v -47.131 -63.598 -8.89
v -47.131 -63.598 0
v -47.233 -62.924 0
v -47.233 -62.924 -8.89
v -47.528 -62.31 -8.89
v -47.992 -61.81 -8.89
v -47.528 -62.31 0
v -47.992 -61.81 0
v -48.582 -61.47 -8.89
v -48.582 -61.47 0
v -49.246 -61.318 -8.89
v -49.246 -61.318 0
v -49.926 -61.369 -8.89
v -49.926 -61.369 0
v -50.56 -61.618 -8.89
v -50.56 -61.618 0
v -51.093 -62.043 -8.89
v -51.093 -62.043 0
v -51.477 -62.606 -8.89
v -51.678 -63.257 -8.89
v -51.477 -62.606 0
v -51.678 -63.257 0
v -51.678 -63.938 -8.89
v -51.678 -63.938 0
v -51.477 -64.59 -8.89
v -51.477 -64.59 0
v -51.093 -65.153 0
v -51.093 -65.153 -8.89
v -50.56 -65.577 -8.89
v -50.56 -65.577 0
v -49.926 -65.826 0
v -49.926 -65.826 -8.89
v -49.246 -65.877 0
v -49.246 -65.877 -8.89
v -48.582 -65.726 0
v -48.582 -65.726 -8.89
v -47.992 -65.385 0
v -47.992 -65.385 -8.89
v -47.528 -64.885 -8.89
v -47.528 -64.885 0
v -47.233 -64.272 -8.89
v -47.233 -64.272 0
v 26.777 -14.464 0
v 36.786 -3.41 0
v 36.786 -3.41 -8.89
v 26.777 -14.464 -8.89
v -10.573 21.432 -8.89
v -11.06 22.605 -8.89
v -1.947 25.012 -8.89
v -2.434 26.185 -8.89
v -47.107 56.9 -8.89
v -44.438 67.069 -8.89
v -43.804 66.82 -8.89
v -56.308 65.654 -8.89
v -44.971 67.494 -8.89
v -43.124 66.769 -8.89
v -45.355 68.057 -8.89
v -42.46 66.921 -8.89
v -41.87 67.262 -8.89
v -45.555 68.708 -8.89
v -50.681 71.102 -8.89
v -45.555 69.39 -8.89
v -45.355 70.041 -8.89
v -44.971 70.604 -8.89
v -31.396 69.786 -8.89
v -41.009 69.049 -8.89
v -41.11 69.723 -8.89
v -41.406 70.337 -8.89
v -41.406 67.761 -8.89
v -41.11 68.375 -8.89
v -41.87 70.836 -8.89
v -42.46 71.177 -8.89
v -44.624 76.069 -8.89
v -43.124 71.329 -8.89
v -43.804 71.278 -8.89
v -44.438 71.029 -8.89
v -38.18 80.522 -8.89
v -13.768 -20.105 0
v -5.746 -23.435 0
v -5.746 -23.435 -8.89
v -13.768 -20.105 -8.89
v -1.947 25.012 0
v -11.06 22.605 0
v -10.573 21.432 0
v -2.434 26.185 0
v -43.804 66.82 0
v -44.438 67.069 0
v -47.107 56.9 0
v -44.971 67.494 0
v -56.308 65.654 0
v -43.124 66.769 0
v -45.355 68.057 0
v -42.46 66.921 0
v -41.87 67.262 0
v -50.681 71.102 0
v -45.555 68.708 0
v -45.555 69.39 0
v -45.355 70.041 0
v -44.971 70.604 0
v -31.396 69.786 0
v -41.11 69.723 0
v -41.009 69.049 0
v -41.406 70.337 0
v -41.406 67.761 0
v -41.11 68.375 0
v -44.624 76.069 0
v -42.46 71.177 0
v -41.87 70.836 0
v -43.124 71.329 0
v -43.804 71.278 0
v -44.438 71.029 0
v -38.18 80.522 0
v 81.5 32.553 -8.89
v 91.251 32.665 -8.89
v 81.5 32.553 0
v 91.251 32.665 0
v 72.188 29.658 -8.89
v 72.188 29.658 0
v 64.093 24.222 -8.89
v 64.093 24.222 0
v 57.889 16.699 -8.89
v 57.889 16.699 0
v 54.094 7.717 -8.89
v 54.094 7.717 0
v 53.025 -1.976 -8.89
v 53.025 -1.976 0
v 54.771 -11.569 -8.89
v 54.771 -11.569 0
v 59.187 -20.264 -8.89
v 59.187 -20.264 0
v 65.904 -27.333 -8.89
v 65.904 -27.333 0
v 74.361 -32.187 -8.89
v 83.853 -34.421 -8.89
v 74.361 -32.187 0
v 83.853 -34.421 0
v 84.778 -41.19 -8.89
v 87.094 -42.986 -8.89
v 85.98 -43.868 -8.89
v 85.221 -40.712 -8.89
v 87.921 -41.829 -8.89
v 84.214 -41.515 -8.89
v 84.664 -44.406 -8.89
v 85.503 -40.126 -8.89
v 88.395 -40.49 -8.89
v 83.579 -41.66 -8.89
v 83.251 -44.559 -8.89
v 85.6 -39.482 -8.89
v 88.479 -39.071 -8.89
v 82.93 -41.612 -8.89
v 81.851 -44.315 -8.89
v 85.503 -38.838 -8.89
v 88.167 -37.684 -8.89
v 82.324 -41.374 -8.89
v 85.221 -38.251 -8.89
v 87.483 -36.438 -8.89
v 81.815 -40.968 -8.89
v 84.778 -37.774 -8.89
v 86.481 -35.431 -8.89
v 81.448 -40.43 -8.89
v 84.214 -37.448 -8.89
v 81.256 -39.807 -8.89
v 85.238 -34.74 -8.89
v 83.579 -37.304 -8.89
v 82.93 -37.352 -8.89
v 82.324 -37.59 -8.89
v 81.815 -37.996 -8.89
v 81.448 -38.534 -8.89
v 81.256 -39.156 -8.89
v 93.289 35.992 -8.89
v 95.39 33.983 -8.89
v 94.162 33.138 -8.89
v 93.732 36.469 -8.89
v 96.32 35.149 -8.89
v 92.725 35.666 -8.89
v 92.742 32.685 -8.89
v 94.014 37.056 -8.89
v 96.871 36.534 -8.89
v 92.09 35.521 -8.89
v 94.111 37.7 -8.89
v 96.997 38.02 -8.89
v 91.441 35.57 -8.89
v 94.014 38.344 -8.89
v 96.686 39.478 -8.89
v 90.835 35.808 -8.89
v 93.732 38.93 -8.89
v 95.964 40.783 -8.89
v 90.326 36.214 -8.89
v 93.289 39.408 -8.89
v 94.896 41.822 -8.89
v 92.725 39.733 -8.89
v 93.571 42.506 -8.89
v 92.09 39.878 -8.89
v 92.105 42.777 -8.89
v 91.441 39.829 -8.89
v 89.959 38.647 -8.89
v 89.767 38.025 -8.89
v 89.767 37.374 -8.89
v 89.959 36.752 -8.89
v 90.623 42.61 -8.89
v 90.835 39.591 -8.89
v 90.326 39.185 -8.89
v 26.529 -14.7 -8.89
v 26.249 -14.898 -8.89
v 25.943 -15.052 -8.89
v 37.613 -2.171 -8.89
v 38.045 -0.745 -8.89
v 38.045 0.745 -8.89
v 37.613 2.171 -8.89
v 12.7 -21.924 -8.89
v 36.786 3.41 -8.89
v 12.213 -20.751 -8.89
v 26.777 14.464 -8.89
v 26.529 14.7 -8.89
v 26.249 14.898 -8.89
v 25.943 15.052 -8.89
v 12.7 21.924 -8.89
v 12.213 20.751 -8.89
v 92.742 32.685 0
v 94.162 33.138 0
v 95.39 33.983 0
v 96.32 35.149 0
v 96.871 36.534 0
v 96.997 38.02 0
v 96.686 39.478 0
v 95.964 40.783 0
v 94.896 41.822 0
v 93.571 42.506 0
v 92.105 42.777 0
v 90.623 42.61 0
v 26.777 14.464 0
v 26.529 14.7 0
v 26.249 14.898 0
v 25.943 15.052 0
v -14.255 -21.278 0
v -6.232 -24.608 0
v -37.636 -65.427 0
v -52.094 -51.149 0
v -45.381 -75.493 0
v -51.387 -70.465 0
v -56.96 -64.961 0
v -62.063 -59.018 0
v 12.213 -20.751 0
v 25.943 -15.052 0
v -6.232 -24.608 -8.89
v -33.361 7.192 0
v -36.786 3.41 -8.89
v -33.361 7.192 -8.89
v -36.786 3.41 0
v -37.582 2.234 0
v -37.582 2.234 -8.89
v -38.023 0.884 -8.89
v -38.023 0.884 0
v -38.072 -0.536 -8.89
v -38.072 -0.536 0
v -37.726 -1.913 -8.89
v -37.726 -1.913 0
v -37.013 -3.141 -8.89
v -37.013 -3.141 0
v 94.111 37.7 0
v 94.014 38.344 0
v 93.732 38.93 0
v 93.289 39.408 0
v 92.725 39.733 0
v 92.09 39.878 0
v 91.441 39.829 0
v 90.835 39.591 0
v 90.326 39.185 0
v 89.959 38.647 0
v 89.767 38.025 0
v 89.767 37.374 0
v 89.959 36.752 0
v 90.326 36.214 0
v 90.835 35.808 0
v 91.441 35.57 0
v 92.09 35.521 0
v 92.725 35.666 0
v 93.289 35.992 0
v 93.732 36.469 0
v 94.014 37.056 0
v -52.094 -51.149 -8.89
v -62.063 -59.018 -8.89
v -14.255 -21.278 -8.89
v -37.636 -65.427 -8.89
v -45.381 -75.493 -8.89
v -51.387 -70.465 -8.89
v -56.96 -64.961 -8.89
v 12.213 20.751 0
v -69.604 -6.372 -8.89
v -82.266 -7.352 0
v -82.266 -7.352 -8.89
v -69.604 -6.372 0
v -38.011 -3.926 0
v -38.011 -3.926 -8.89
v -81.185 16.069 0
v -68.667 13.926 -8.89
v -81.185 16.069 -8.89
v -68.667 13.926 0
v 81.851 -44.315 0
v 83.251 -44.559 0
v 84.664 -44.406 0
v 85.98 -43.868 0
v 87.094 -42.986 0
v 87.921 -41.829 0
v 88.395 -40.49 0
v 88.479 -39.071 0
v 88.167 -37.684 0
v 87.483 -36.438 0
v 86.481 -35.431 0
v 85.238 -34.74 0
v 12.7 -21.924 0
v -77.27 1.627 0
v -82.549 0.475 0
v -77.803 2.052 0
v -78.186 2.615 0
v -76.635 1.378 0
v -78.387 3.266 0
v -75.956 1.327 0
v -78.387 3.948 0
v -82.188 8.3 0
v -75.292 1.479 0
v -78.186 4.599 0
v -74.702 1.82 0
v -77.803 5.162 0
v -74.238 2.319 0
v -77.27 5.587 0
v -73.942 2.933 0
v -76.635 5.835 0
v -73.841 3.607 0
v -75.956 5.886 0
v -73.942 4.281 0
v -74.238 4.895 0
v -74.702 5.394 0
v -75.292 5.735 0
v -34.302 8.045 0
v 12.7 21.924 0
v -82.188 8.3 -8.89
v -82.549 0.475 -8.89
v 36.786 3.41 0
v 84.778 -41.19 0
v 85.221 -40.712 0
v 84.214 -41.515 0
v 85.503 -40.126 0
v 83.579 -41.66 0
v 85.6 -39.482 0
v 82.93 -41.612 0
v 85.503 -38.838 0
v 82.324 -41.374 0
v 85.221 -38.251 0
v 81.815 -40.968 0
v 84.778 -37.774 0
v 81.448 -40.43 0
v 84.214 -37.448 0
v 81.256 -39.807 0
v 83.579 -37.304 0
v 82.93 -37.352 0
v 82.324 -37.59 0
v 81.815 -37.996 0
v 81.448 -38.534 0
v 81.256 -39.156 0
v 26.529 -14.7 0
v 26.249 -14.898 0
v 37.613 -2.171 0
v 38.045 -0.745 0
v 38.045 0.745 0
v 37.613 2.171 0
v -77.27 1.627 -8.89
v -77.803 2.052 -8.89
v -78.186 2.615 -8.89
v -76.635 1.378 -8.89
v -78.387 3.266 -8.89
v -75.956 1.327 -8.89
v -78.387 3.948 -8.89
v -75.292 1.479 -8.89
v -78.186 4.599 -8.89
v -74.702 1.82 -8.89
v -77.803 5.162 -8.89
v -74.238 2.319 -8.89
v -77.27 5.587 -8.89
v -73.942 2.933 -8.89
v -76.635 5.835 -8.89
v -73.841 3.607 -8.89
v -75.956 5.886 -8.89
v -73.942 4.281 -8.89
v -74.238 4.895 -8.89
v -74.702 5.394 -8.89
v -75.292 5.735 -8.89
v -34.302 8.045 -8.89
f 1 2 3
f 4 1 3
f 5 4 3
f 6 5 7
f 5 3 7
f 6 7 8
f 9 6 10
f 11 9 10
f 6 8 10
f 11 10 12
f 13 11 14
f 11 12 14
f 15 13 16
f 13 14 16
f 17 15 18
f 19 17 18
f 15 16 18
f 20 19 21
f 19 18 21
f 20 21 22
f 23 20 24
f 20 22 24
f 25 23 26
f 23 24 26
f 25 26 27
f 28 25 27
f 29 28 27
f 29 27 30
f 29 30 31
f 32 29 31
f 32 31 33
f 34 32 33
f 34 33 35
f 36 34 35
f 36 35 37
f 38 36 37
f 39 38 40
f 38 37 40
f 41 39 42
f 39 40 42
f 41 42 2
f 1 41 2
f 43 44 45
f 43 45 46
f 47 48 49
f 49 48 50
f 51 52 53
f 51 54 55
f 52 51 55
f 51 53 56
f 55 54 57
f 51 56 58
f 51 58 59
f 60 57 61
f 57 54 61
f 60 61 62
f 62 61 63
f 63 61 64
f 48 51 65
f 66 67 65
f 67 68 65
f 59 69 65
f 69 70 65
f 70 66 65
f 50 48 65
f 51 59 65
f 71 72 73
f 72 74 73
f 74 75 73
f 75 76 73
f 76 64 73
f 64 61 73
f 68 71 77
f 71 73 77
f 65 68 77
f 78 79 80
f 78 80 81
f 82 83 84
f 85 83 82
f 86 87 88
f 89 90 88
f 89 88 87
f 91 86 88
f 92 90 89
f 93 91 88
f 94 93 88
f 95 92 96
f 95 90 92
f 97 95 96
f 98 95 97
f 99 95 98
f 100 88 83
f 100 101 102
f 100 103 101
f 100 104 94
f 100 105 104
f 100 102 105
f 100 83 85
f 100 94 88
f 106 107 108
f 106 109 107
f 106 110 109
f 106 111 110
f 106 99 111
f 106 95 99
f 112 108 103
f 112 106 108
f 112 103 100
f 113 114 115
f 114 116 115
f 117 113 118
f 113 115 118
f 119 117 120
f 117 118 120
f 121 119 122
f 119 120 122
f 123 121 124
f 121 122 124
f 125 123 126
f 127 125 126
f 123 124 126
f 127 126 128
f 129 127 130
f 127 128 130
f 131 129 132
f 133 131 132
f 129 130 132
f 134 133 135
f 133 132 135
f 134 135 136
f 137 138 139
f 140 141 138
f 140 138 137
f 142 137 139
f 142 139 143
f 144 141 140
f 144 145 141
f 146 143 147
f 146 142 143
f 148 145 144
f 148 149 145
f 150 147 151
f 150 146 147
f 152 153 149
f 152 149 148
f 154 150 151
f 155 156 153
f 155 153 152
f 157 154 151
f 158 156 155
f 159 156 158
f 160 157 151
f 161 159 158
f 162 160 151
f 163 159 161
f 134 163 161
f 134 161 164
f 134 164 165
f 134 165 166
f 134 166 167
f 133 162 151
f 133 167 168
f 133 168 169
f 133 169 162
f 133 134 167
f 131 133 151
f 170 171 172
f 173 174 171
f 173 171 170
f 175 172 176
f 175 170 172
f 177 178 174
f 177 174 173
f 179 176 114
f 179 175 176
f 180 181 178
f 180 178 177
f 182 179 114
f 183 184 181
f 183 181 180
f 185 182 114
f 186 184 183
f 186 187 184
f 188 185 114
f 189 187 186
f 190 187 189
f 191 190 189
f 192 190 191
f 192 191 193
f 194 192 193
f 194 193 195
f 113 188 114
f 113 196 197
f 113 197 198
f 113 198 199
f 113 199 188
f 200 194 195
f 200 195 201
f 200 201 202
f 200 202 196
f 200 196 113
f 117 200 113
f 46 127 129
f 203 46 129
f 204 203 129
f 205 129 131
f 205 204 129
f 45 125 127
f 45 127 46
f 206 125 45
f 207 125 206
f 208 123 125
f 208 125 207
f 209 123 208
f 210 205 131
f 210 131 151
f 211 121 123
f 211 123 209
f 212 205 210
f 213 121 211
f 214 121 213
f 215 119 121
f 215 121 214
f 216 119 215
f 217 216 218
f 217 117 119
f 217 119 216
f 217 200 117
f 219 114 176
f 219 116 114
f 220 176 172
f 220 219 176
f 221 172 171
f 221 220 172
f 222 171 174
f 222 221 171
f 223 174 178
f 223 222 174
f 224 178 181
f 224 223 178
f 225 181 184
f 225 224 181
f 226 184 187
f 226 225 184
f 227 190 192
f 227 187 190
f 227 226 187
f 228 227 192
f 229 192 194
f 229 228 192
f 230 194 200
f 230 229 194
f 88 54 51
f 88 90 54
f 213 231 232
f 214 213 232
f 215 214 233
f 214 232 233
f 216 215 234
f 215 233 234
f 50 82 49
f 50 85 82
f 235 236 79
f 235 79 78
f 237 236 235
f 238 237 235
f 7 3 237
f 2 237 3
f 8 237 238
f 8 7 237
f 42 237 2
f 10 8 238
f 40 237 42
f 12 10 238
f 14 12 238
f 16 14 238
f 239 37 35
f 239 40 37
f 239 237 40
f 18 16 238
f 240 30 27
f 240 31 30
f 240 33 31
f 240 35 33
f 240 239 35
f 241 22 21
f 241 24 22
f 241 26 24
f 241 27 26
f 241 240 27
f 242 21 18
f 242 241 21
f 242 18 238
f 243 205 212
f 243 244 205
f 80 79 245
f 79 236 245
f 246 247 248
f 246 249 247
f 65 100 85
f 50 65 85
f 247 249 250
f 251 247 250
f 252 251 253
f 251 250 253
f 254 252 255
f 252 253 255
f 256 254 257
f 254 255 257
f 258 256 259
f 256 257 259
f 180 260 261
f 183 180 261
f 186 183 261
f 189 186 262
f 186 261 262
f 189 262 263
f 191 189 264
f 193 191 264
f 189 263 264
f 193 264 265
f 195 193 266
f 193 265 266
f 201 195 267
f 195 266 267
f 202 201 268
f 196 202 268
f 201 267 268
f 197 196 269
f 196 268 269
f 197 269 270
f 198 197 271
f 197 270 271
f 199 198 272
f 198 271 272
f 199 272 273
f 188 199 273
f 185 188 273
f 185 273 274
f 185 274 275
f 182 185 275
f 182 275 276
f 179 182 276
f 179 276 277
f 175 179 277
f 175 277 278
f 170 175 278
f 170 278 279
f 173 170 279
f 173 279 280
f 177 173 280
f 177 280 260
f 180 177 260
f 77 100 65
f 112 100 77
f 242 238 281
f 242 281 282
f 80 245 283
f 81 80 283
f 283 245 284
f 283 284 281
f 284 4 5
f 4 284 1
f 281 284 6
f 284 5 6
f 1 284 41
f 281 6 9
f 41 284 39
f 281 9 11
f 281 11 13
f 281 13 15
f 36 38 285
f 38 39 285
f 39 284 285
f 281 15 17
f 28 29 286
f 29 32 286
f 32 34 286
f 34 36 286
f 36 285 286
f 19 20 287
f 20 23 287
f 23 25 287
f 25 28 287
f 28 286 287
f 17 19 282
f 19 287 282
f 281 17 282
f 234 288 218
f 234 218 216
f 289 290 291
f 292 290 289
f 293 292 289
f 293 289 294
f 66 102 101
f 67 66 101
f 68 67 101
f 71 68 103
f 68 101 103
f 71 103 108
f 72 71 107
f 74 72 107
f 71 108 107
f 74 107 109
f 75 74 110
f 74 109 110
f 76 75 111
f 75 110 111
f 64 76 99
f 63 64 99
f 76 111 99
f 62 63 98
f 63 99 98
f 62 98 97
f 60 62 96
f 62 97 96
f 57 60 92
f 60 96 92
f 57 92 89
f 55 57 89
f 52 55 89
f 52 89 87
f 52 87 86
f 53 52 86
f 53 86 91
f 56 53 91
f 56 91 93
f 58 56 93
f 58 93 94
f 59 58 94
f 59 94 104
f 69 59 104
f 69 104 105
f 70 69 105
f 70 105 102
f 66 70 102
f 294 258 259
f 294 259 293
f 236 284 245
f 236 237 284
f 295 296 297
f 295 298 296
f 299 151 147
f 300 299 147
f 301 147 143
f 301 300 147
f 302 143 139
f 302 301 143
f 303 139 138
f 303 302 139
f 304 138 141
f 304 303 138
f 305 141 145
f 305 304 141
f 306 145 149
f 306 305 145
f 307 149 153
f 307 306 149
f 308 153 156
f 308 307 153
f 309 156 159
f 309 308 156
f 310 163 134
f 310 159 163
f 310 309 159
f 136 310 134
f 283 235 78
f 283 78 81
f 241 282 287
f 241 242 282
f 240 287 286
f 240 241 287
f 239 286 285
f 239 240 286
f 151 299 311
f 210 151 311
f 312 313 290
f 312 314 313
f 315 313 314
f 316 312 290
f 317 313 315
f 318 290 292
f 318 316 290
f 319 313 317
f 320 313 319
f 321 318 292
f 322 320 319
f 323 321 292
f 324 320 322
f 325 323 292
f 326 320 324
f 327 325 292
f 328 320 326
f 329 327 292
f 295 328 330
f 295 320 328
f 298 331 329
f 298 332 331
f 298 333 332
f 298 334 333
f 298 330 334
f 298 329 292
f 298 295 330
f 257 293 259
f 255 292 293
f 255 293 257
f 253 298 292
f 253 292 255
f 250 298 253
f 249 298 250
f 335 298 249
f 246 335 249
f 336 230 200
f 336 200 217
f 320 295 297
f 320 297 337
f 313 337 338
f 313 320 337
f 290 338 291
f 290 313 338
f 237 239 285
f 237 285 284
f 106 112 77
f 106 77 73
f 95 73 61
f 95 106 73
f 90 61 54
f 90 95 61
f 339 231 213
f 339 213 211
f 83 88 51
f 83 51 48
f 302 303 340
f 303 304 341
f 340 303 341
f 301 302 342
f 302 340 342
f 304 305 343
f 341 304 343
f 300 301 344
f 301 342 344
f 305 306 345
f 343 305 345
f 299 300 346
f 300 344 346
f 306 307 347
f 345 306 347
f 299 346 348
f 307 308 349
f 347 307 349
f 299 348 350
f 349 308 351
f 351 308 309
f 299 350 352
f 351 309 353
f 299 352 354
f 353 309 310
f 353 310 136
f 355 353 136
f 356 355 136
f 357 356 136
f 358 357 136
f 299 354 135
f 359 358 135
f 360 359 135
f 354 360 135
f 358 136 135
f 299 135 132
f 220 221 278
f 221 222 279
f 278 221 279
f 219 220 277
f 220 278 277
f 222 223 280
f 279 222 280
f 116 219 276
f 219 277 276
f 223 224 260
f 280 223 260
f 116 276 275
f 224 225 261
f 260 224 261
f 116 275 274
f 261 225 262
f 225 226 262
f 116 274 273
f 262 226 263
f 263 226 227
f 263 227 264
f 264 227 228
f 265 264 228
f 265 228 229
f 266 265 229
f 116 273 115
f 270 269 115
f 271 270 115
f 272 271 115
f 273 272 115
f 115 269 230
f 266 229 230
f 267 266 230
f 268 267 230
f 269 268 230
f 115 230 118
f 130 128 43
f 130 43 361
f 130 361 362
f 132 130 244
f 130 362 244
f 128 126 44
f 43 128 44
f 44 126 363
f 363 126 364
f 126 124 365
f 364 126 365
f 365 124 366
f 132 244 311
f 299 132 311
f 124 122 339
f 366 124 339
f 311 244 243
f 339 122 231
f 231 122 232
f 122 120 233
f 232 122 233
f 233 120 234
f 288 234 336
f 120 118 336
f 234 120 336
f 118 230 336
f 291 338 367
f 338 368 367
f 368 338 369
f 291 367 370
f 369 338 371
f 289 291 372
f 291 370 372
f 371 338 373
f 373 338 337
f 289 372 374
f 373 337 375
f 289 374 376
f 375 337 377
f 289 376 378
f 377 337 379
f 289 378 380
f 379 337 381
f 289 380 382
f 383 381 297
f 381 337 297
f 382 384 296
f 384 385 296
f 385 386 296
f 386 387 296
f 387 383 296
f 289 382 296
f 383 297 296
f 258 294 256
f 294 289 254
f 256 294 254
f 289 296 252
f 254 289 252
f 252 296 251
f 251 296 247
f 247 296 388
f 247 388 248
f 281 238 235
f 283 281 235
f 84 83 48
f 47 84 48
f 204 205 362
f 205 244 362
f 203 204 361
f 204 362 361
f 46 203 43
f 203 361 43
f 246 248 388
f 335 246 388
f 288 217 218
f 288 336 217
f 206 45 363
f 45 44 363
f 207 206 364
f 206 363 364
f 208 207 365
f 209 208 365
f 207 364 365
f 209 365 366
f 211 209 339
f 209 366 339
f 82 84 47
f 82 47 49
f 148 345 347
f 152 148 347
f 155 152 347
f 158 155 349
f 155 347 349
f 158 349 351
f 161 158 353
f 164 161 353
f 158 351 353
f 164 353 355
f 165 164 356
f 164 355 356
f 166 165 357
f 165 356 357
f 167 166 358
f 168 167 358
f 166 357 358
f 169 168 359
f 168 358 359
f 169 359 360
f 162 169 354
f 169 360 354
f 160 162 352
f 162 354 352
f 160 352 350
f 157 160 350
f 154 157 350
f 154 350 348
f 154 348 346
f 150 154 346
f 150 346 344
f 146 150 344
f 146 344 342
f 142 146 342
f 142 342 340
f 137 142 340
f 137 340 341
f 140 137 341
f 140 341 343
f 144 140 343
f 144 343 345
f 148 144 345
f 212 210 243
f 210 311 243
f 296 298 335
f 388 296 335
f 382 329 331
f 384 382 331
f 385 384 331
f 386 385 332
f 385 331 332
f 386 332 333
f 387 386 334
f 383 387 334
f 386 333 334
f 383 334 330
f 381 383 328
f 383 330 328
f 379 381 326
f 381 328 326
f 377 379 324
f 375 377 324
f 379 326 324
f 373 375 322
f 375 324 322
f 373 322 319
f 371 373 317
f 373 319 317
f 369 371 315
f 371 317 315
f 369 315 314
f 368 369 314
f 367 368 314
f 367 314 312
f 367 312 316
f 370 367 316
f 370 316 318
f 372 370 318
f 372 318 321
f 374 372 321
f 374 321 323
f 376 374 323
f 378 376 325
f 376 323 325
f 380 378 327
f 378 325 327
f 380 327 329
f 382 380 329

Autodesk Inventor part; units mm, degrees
ref_plane "YZ Plane" through (0, 0, 0) normal (1, 0, 0) x (0, 1, 0)
ref_plane "XZ Plane" through (0, 0, 0) normal (0, 1, 0) x (-1, 0, 0)
ref_plane "Work Plane1" through (0, 0, 0) normal (0, 0, 1) x (1, 0, 0)
sketch "Sketch1" plane through (0, 0, 0) normal (0, 0, 1) x (1, 0, 0)
  circle A0 centre (33.02, 0) radius 2.286
  circle A1 centre (-33.02, 0) radius 2.286
  circle A2 centre (0, 20.32) radius 2.286
  circle A3 centre (0, -20.32) radius 2.286
  arc A4 (-27.8119, -10.2) -> (-26.3675, -11.6445) centre (-26.3675, -10.2) ccw
  line L0 (-26.3675, -11.6445) -> (-25.45, -11.6445)
  arc A5 (-23.5945, -13.5) -> (-25.45, -11.6445) centre (-25.45, -13.5) ccw
  line L1 (-23.5945, -13.5) -> (-23.5945, -14.2175)
  arc A6 (-23.5945, -14.2175) -> (-22.452, -15.63) centre (-22.15, -14.2175) ccw
  line L2 (-22.452, -15.63) -> (-22.452, -15.827)
  line L3 (-22.452, -15.827) -> (-21.448, -15.827)
  line L4 (-21.448, -15.827) -> (-21.448, -15.6619)
  line L5 (-21.448, -15.6619) -> (22.15, -15.6619)
  arc A7 (22.15, -15.6619) -> (23.5945, -14.2175) centre (22.15, -14.2175) ccw
  line L6 (23.5945, -14.2175) -> (23.5945, -13.5)
  arc A8 (25.45, -11.6445) -> (23.5945, -13.5) centre (25.45, -13.5) ccw
  line L7 (25.45, -11.6445) -> (26.3675, -11.6445)
  arc A9 (26.3675, -11.6445) -> (27.8119, -10.2) centre (26.3675, -10.2) ccw
  line L8 (27.8119, -10.2) -> (27.8119, 10.2)
  arc A10 (27.8119, 10.2) -> (26.3675, 11.6445) centre (26.3675, 10.2) ccw
  line L9 (26.3675, 11.6445) -> (25.45, 11.6445)
  arc A11 (23.5945, 13.5) -> (25.45, 11.6445) centre (25.45, 13.5) ccw
  line L10 (23.5945, 13.5) -> (23.5945, 14.2175)
  arc A12 (23.5945, 14.2175) -> (22.15, 15.6619) centre (22.15, 14.2175) ccw
  line L11 (22.15, 15.6619) -> (-21.448, 15.6619)
  line L12 (-21.448, 15.6619) -> (-21.448, 15.827)
  line L13 (-21.448, 15.827) -> (-22.452, 15.827)
  line L14 (-22.452, 15.827) -> (-22.452, 15.63)
  arc A13 (-22.452, 15.63) -> (-23.5945, 14.2175) centre (-22.15, 14.2175) ccw
  line L15 (-23.5945, 14.2175) -> (-23.5945, 13.5)
  arc A14 (-25.45, 11.6445) -> (-23.5945, 13.5) centre (-25.45, 13.5) ccw
  line L16 (-25.45, 11.6445) -> (-26.3675, 11.6445)
  arc A15 (-26.3675, 11.6445) -> (-27.8119, 10.2) centre (-26.3675, 10.2) ccw
  line L17 (-27.8119, 10.2) -> (-27.8119, -10.2)
  arc A16 (-27.7187, -15.3162) -> (-26.4301, -16.225) centre (-25.05, -12.9) ccw
  line L18 (-27.7187, -15.3162) -> (-37.7272, -4.262)
  arc A17 (-37.7272, 4.262) -> (-37.7272, -4.262) centre (-33.02, 0) ccw
  line L19 (-37.7272, 4.262) -> (-27.7187, 15.3162)
  arc A18 (-26.4301, 16.225) -> (-27.7187, 15.3162) centre (-25.05, 12.9) ccw
  line L20 (-26.4301, 16.225) -> (-2.4343, 26.1849)
  arc A19 (2.4343, 26.1849) -> (-2.4343, 26.1849) centre (0, 20.32) ccw
  line L21 (2.4343, 26.1849) -> (26.4301, 16.225)
  arc A20 (27.7187, 15.3162) -> (26.4301, 16.225) centre (25.05, 12.9) ccw
  line L22 (27.7187, 15.3162) -> (37.7272, 4.262)
  arc A21 (37.7272, -4.262) -> (37.7272, 4.262) centre (33.02, 0) ccw
  line L23 (37.7272, -4.262) -> (27.7187, -15.3162)
  arc A22 (26.4301, -16.225) -> (27.7187, -15.3162) centre (25.05, -12.9) ccw
  line L24 (26.4301, -16.225) -> (2.4343, -26.1849)
  arc A23 (-2.4343, -26.1849) -> (2.4343, -26.1849) centre (0, -20.32) ccw
  line L25 (-2.4343, -26.1849) -> (-26.4301, -16.225)
  circle A24 centre (-76.1268, 3.6068) radius 2.286
  arc A25 (-81.1848, 16.0688) -> (-82.2658, -7.3525) centre (12.7, 0) ccw
  line L26 (-68.6668, 13.9263) -> (-81.1848, 16.0688)
  arc A26 (-68.6668, 13.9263) -> (-69.6037, -6.3721) centre (12.7, 0) ccw
  line L27 (-82.2658, -7.3525) -> (-69.6037, -6.3721)
  circle A27 centre (-43.2949, 69.0491) radius 2.286
  arc A28 (-38.1798, 80.5221) -> (-56.3085, 65.6536) centre (12.7, 0) ccw
  line L28 (-31.3958, 69.7858) -> (-38.1798, 80.5221)
  arc A29 (-31.3958, 69.7858) -> (-47.1073, 56.8998) centre (12.7, 0) ccw
  line L29 (-56.3085, 65.6536) -> (-47.1073, 56.8998)
  circle A30 centre (-49.4171, -63.5977) radius 2.286
  circle A31 centre (-49.4171, -63.5977) radius 2.286
  arc A32 (-62.0626, -59.0179) -> (-45.3806, -75.4931) centre (12.7, 0) ccw
  line L30 (-52.0943, -51.1489) -> (-62.0626, -59.0179)
  arc A33 (-52.0943, -51.1489) -> (-37.6365, -65.4274) centre (12.7, 0) ccw
  line L31 (-45.3806, -75.4931) -> (-37.6365, -65.4274)
  line L32 (-31.3958, 69.7858) -> (-2.4343, 26.1849)
  line L33 (-47.1073, 56.8998) -> (-11.0598, 22.6047)
  line L34 (-68.6668, 13.9263) -> (-34.3024, 8.0446)
  line L35 (-69.6037, -6.3721) -> (-38.0108, -3.9261)
  line L36 (-37.6365, -65.4274) -> (-6.2324, -24.6084)
  line L37 (-52.0943, -51.1489) -> (-14.2551, -21.2784)
  circle A34 centre (83.416, -39.4819) radius 2.1844
  circle A35 centre (91.9268, 37.6997) radius 2.1844
  circle A36 centre (91.9268, 37.6997) radius 5.08
  circle A37 centre (83.416, -39.4819) radius 5.08
  arc A38 (91.2509, 32.6649) -> (83.8534, -34.4207) centre (86.7596, -0.7905) ccw
  line L38 (90.6234, 42.6097) -> (12.7, 21.9239)
  line L39 (81.8511, -44.3148) -> (12.7, -21.9239)
  point P0 (0, 0)
extrude "Extrusion1" add sketch "Sketch1" against normal blind 8.89 contours L25 L36 A33 L37 | L35 A26 L34 L19 A17 | A33 L31 A32 L30 | L27 A25 L26 A26 | L24 A22 L23 A21 L22 A20 L21 L38 A36 A38 A37 L39 | A37 | L33 A29 L32 L20 | L29 A28 L28 A29 | A36
sketch "Sketch2" plane through (0, 0, 0) normal (0, 0, 1) x (1, 0, 0)
  point P0 (0, 0)
thicken "Thicken1" operation add thickness 1.27 both sides no extend neighbours no toward (0.7912881, -0.6114435, 0) faces at (-38.0447, 3.8827, -5.9267) (-36.5856, 5.5229, -2.9633)
thicken "Thicken2" operation add thickness 1.27 both sides no extend neighbours no toward (0.3833577, -0.9235999, 0) faces at (-8.1846, 23.7981, -2.9633)
thicken "Thicken3" operation add thickness 1.27 both sides no extend neighbours no toward (-0.3833577, -0.9235999, 0) faces at (17.2767, 20.0242, -2.9633) (27.597, 15.4442, -5.9267) (31.0549, 11.6315, -2.9633) (38.8468, -2.524, -5.9267) (34.3911, -7.9467, -5.9267) (27.597, -15.4442, -2.9633) (21.8534, -18.1246, -2.9633)
thicken "Thicken4" operation add thickness 1.27 both sides no extend neighbours no toward (0.3833577, 0.9235999, 0) faces at (-8.9066, -23.4984, -2.9633)
properties part number "MotorConnectionRoundyBit" material "Plastic, Opaque Black"
